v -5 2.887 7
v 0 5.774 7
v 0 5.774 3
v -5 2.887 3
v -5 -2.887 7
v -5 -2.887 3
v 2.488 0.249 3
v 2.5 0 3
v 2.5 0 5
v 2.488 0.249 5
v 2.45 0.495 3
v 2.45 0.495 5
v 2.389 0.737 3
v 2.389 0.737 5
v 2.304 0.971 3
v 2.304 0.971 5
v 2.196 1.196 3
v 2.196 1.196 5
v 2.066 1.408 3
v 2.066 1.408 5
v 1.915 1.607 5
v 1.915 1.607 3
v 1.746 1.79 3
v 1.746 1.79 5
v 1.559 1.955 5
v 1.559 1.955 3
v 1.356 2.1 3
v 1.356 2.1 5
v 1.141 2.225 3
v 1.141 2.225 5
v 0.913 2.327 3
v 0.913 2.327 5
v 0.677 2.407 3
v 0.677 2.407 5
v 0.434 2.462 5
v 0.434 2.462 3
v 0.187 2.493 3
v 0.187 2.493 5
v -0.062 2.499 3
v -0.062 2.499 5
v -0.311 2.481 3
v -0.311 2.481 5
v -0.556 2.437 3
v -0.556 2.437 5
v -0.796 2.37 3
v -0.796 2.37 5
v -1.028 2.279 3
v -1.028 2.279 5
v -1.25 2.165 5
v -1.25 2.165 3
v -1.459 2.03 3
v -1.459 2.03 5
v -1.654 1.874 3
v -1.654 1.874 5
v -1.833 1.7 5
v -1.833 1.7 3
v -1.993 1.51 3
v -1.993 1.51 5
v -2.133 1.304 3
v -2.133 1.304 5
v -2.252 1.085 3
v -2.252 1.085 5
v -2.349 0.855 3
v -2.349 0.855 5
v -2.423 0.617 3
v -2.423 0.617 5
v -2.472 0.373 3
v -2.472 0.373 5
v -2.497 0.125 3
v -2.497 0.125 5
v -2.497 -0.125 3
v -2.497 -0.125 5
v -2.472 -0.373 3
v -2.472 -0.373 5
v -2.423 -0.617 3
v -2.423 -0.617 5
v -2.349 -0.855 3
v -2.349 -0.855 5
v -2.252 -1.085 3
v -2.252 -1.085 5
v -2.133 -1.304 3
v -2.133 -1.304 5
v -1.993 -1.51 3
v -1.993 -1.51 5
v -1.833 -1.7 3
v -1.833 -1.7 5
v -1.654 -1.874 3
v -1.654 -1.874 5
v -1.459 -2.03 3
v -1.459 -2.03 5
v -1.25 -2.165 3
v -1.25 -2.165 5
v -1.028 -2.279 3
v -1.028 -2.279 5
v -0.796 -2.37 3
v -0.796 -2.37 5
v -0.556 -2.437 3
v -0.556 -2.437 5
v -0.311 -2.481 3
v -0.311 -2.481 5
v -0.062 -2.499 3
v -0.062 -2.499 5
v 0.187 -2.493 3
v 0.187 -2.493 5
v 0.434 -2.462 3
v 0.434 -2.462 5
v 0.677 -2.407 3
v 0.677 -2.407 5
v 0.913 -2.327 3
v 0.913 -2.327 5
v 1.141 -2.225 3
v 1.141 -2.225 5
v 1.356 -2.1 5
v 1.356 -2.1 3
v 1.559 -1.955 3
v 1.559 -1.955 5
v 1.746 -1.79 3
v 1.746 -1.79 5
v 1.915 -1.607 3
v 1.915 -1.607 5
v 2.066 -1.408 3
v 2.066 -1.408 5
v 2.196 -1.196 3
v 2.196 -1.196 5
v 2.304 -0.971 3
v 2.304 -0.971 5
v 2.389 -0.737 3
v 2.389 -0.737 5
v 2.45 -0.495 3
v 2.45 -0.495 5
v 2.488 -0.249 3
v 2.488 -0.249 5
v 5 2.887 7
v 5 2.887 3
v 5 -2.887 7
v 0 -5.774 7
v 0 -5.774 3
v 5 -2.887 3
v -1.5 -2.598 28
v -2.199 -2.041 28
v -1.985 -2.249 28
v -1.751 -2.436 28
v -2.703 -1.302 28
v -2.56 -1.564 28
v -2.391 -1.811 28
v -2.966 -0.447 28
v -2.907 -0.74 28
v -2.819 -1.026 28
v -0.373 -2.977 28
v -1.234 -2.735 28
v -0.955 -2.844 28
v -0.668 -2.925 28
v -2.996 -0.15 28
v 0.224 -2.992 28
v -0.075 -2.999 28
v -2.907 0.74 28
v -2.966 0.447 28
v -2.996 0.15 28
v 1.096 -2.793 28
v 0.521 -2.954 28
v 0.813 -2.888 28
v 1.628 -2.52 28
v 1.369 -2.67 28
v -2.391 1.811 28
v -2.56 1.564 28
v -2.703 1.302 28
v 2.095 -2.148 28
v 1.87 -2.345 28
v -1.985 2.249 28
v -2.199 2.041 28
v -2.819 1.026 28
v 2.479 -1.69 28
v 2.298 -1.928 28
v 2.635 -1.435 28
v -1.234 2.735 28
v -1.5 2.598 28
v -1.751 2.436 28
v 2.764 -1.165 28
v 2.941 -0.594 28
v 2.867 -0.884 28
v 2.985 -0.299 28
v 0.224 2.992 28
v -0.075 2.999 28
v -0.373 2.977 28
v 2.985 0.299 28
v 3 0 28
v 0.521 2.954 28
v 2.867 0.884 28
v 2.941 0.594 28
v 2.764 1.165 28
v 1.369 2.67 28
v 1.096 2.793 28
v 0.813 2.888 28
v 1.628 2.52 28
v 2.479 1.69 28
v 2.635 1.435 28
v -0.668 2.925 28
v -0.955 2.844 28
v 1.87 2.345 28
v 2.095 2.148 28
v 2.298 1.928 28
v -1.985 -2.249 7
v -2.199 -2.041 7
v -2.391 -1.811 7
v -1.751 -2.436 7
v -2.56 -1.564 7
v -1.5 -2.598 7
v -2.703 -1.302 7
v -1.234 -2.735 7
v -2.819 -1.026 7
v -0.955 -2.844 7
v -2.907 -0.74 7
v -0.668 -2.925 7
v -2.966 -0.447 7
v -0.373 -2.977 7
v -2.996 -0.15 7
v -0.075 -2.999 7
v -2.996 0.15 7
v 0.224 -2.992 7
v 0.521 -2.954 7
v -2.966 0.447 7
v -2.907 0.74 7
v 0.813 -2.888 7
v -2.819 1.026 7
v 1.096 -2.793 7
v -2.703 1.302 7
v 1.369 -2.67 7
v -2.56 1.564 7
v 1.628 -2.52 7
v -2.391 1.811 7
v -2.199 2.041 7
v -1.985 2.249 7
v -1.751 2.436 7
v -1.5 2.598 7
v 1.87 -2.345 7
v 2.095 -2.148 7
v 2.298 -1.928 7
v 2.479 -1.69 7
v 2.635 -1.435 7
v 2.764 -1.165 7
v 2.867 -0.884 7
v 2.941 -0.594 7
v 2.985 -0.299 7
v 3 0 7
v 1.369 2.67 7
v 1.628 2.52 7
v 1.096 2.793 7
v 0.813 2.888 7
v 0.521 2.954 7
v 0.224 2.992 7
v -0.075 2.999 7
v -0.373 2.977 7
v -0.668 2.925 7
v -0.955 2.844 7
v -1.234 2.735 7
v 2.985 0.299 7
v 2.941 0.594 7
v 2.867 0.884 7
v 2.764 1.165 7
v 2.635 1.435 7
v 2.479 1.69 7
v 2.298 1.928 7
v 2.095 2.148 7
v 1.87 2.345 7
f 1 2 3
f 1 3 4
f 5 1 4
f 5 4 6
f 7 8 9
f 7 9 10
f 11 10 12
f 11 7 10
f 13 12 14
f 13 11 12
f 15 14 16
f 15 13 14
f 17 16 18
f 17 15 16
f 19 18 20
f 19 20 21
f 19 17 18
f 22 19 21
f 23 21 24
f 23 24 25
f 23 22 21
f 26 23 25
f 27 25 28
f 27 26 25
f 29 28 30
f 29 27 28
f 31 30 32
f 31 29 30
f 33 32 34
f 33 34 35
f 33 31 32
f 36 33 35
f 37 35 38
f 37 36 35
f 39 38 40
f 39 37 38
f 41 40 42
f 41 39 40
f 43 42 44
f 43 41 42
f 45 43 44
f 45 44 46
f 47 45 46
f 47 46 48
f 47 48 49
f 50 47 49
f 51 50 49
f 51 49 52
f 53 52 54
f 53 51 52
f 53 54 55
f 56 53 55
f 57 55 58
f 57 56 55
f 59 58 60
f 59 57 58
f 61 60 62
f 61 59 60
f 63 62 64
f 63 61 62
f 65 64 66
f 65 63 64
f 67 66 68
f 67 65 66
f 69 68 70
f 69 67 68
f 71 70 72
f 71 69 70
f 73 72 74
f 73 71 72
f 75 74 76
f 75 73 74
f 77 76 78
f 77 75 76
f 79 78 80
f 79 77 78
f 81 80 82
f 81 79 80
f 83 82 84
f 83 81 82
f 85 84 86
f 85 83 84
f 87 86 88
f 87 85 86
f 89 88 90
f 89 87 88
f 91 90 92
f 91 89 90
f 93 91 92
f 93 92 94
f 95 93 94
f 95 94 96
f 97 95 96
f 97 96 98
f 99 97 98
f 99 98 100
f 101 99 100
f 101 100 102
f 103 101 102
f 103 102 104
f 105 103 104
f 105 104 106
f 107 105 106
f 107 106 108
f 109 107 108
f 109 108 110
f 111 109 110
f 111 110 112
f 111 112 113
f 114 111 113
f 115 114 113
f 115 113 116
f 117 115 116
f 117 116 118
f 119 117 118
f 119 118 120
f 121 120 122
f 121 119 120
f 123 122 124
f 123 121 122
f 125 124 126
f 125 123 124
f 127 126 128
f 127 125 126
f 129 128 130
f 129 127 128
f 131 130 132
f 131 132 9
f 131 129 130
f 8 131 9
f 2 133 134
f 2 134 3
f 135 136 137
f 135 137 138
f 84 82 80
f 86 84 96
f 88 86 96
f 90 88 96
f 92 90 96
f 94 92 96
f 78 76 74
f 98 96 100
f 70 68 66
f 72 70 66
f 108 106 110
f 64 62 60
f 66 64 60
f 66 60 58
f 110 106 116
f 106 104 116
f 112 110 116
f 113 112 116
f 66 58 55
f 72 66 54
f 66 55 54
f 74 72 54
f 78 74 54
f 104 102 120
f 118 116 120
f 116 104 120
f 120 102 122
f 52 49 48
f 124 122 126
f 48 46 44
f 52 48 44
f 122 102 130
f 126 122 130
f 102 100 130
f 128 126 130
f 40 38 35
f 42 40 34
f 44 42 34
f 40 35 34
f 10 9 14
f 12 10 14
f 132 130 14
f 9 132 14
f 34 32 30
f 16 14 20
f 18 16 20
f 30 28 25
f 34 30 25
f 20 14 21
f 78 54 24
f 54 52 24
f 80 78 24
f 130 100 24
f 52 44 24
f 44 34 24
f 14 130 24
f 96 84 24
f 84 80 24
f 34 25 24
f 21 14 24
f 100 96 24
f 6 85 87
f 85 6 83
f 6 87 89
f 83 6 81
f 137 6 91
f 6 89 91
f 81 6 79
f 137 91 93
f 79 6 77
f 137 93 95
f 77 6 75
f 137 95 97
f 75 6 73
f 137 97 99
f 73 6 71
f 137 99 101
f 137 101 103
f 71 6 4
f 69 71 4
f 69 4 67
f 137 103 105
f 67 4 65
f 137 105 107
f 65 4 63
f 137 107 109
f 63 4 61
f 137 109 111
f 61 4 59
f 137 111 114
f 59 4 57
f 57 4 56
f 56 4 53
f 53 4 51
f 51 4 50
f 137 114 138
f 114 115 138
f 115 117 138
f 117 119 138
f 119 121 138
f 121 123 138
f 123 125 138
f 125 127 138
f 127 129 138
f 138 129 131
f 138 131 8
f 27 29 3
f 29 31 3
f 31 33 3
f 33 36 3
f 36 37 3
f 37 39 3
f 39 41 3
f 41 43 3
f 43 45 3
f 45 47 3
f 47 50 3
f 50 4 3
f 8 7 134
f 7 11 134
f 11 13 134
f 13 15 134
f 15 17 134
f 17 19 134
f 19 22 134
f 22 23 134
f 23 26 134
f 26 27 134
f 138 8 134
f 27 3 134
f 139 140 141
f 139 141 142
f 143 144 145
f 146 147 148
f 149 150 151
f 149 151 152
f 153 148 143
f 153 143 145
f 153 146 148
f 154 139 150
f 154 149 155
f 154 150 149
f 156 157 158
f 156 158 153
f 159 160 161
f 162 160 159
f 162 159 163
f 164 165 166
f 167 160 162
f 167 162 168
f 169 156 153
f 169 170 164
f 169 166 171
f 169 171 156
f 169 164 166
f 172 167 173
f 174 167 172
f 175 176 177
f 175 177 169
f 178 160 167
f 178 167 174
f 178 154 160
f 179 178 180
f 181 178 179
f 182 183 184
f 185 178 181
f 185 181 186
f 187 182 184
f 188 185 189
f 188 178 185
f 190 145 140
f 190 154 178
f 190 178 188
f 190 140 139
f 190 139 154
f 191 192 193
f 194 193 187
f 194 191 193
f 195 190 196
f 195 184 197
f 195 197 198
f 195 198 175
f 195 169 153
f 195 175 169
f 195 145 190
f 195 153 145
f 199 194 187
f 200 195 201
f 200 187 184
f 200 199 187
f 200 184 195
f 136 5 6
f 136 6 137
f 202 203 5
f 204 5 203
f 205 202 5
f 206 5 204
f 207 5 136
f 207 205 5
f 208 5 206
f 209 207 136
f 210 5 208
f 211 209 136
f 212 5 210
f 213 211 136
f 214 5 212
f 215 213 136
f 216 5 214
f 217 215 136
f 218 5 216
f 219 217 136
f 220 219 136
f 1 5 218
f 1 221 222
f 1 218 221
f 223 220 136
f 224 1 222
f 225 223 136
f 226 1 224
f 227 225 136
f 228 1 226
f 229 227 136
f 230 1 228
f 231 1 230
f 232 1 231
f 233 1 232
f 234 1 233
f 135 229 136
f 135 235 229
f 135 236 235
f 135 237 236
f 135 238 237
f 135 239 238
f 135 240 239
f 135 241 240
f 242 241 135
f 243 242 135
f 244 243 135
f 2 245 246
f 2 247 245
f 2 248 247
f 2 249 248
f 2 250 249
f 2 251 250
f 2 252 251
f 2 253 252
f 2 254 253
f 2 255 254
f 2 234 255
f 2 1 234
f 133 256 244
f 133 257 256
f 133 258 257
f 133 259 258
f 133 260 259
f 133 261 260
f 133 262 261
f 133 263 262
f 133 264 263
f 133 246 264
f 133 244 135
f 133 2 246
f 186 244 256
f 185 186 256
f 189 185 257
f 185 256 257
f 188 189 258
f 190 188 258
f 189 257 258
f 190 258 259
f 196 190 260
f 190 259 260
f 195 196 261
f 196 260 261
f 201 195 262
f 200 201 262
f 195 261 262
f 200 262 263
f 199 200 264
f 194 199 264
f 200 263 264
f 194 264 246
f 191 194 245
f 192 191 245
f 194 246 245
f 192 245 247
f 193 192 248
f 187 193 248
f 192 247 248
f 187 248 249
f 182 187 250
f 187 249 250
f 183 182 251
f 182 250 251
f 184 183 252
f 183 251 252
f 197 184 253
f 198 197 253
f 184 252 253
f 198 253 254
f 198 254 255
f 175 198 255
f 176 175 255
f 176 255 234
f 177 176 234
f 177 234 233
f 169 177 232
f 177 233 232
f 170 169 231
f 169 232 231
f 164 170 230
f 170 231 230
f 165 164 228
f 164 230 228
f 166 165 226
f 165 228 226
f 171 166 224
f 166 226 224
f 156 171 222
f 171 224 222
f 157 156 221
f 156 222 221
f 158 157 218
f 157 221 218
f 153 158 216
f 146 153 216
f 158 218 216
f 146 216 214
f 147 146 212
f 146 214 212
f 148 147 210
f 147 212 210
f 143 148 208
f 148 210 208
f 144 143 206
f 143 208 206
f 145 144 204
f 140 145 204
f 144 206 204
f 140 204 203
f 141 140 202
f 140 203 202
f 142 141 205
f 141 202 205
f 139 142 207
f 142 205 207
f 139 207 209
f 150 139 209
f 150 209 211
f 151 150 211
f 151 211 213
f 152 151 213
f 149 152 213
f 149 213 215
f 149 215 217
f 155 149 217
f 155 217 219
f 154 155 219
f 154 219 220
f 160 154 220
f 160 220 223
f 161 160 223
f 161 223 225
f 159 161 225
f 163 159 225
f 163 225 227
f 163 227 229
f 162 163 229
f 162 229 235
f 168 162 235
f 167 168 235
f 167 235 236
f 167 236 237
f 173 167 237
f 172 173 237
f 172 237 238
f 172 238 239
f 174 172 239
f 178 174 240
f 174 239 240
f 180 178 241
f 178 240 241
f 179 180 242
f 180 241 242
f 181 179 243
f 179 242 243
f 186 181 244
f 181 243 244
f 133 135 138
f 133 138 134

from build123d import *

# Parameters (mm, degrees)
PAD007_DEPTH    = 4
SKETCH011_R     = 3
PAD008_DEPTH    = 21
SKETCH013_R     = 2.5
POCKET001_DEPTH = 2


with BuildPart() as part:
    # Sketch010 → Pad007 (new body)
    with BuildSketch(Plane.XY):
        Polygon((5, -2.886751), (5, 2.886751), (0, 5.773503), (-5, 2.886751), (-5, -2.886751), (0, -5.773503), align=None)
    extrude(amount=-PAD007_DEPTH)

    # Sketch011 → Pad008 (join)
    with BuildSketch(Plane.XY):
        Circle(SKETCH011_R)
    extrude(amount=PAD008_DEPTH)

    # Sketch013 → Pocket001 (cut)
    with BuildSketch(Plane.XY.offset(-4)):
        Circle(SKETCH013_R)
    extrude(amount=POCKET001_DEPTH, mode=Mode.SUBTRACT)


with BuildPart() as part_1:
    # Body007 placement: moved
    add(part.part.moved(Location((0, 0, 7))))


solid = part_1.part
